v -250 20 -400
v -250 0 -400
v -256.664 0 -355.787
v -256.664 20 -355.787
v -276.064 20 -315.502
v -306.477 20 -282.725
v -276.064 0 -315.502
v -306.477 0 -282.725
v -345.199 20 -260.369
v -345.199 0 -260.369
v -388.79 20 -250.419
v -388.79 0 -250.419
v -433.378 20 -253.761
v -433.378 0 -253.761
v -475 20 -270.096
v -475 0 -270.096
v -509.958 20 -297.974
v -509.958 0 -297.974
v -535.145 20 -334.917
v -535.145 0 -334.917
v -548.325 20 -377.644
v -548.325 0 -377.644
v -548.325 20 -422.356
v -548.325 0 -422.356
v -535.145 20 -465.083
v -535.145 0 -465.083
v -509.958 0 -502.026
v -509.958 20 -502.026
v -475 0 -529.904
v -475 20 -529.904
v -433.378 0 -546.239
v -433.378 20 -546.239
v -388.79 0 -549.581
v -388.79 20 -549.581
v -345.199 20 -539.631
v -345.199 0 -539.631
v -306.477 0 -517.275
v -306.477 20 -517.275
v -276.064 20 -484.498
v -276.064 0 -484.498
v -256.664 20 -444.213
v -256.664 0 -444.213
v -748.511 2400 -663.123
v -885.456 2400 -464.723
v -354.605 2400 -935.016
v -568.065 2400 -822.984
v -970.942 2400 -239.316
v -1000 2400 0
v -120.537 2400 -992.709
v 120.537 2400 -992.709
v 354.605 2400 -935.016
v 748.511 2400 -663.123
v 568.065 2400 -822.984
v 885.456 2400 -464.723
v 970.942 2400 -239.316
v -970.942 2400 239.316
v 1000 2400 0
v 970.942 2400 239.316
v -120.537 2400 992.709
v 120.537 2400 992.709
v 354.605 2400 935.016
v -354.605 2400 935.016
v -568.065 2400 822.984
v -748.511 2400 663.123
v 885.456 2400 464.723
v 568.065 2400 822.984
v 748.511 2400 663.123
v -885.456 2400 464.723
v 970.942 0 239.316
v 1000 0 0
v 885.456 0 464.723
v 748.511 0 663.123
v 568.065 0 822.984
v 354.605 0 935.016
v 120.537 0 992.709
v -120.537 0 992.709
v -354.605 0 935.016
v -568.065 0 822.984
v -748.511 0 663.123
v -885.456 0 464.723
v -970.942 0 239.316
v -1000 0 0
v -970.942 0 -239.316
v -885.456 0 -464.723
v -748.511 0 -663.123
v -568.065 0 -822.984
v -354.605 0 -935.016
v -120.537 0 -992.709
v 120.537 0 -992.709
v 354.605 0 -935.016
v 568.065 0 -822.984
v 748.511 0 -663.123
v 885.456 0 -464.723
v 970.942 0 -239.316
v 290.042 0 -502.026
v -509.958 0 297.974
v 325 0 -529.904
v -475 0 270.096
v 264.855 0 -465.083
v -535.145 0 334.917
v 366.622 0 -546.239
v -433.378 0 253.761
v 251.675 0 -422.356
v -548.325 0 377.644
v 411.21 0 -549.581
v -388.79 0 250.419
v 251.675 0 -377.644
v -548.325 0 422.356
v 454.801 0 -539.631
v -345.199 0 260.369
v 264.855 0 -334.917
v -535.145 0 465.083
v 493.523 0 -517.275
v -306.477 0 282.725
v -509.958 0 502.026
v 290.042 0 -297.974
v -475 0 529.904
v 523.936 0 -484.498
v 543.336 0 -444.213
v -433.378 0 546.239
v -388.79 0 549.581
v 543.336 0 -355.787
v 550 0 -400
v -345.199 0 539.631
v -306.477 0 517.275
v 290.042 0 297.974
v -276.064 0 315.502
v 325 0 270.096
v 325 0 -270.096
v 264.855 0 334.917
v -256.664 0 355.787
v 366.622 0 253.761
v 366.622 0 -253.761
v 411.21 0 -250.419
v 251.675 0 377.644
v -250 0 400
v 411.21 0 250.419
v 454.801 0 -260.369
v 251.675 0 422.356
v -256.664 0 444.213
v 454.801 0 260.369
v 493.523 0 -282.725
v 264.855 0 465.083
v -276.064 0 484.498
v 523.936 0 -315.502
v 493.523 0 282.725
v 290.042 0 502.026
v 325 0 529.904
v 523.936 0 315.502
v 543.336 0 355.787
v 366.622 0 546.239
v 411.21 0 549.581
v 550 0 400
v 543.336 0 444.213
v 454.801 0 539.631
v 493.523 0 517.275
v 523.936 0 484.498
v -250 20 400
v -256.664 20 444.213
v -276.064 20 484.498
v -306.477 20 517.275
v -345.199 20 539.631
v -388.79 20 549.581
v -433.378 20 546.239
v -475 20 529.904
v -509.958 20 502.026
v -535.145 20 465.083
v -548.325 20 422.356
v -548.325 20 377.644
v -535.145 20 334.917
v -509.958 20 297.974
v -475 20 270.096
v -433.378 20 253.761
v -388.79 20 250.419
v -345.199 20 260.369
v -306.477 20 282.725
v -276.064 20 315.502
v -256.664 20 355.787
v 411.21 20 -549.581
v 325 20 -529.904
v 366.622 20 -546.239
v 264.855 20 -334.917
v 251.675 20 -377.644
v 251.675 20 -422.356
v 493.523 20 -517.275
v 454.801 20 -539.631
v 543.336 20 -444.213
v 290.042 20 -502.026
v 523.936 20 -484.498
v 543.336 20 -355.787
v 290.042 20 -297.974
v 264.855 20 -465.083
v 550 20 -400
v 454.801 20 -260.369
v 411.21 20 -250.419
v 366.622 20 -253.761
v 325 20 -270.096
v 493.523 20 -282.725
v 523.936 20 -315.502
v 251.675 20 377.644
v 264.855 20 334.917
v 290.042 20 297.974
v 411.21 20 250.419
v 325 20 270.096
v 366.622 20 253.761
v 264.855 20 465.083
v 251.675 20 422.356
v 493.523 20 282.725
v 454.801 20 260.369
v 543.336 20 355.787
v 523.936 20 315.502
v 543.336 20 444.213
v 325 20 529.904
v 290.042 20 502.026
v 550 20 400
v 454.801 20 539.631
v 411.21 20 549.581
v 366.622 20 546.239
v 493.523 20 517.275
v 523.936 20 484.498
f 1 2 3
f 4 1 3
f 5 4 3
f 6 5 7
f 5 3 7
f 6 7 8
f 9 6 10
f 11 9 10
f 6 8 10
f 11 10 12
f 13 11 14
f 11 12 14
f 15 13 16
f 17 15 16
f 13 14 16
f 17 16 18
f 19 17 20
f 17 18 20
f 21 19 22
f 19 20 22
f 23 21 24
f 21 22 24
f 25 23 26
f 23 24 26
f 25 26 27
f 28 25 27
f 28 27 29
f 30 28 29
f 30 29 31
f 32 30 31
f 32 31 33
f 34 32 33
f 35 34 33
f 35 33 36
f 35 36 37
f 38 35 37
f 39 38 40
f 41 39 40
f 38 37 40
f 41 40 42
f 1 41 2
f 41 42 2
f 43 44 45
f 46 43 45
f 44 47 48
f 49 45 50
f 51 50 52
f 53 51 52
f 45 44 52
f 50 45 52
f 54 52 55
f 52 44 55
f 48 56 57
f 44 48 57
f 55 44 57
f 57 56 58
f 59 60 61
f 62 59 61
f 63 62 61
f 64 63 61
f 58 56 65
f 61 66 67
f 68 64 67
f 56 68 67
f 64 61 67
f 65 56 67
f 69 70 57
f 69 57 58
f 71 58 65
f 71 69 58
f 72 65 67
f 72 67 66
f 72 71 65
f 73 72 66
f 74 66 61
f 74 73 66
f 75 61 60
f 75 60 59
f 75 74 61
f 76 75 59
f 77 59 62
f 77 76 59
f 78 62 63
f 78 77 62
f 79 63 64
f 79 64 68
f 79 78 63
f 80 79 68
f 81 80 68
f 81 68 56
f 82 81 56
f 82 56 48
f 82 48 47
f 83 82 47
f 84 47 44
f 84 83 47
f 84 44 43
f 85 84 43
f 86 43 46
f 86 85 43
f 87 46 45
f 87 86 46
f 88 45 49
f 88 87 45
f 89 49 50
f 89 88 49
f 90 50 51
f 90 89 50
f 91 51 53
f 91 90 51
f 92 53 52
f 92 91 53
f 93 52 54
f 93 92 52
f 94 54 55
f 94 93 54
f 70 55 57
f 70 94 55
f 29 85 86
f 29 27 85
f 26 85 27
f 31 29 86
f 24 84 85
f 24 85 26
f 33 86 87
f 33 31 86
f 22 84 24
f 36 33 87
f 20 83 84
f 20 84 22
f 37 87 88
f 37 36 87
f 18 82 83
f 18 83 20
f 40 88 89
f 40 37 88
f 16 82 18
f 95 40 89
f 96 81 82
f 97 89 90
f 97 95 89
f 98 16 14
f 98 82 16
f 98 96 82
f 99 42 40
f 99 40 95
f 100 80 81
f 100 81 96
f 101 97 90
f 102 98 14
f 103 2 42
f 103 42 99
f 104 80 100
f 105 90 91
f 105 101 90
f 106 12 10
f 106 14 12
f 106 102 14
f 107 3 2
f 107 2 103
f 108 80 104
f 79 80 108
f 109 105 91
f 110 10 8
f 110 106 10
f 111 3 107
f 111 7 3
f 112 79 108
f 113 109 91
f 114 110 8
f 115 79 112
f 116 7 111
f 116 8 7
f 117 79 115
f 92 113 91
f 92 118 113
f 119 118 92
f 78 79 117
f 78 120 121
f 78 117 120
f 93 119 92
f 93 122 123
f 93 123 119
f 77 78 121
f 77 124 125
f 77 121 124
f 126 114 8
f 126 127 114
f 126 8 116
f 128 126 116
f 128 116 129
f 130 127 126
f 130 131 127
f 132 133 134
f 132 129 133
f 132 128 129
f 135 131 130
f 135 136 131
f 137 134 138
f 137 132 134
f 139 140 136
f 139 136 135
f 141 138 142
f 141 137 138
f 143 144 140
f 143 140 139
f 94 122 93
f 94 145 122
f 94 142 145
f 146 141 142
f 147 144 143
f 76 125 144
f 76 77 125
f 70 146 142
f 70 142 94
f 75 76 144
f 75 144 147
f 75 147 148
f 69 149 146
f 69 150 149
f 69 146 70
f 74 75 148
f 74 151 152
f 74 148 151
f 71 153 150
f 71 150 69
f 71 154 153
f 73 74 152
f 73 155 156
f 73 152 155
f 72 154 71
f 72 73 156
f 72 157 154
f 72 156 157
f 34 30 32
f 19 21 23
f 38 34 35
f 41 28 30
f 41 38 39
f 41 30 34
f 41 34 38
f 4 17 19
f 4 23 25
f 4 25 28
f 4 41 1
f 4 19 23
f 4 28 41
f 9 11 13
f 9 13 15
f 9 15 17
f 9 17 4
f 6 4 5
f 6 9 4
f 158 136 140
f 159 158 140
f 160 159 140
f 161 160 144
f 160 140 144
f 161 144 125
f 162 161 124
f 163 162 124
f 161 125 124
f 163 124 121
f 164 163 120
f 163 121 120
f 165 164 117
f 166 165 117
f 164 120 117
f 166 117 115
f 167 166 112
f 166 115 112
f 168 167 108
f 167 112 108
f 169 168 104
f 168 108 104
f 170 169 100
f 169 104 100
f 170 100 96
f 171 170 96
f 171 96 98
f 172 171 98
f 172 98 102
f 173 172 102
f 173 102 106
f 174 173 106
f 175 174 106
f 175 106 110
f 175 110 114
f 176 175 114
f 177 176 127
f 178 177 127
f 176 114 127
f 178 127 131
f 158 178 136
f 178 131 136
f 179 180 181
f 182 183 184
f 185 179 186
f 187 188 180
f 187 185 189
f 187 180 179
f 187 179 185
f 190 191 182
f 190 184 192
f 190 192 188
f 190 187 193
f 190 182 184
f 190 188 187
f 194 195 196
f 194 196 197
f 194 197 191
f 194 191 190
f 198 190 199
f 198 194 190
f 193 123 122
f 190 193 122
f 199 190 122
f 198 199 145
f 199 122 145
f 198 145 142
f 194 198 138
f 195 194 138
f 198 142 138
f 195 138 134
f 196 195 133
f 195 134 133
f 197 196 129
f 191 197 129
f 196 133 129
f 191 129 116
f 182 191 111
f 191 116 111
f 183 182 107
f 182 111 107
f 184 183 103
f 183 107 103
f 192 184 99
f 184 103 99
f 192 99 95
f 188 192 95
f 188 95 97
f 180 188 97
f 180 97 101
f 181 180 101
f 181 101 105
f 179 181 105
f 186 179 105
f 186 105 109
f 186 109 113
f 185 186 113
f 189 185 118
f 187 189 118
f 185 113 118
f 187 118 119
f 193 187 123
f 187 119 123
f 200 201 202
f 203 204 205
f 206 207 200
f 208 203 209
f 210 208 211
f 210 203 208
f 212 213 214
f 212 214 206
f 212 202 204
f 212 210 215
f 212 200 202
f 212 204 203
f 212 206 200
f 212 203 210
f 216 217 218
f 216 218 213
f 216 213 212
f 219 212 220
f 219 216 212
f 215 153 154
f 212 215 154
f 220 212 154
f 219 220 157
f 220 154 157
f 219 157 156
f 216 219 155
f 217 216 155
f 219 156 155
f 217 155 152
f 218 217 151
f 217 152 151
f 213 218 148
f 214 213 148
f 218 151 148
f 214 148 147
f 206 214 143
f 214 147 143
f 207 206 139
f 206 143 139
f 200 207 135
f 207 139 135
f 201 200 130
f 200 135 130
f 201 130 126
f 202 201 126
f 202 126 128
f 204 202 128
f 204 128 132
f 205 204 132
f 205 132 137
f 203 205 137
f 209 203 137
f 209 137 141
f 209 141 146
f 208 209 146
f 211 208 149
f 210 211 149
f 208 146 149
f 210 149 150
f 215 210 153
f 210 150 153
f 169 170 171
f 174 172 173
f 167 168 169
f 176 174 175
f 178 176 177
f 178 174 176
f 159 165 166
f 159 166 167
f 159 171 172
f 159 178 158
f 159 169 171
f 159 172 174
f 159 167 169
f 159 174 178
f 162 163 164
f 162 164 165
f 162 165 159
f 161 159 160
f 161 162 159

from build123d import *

# Parameters (mm, degrees)
F0_R     = 1000
F1_DEPTH = 2400
F2_R     = 150
F3_DEPTH = 20


with BuildPart() as f1:
    # F0 (on Front) → F1 (new body)
    with BuildSketch(Plane.XZ):
        Circle(F0_R)
    extrude(amount=-F1_DEPTH)

    # F2 (on face) → F3 (cut)
    with BuildSketch(Plane.XZ):
        with Locations((-400, 400)):
            Circle(F2_R)
        with Locations((-400, -400)):
            Circle(F2_R)
        with Locations((400, 400)):
            Circle(F2_R)
        with Locations((400, -400)):
            Circle(F2_R)
    extrude(amount=-F3_DEPTH, mode=Mode.SUBTRACT)


solid = f1.part
